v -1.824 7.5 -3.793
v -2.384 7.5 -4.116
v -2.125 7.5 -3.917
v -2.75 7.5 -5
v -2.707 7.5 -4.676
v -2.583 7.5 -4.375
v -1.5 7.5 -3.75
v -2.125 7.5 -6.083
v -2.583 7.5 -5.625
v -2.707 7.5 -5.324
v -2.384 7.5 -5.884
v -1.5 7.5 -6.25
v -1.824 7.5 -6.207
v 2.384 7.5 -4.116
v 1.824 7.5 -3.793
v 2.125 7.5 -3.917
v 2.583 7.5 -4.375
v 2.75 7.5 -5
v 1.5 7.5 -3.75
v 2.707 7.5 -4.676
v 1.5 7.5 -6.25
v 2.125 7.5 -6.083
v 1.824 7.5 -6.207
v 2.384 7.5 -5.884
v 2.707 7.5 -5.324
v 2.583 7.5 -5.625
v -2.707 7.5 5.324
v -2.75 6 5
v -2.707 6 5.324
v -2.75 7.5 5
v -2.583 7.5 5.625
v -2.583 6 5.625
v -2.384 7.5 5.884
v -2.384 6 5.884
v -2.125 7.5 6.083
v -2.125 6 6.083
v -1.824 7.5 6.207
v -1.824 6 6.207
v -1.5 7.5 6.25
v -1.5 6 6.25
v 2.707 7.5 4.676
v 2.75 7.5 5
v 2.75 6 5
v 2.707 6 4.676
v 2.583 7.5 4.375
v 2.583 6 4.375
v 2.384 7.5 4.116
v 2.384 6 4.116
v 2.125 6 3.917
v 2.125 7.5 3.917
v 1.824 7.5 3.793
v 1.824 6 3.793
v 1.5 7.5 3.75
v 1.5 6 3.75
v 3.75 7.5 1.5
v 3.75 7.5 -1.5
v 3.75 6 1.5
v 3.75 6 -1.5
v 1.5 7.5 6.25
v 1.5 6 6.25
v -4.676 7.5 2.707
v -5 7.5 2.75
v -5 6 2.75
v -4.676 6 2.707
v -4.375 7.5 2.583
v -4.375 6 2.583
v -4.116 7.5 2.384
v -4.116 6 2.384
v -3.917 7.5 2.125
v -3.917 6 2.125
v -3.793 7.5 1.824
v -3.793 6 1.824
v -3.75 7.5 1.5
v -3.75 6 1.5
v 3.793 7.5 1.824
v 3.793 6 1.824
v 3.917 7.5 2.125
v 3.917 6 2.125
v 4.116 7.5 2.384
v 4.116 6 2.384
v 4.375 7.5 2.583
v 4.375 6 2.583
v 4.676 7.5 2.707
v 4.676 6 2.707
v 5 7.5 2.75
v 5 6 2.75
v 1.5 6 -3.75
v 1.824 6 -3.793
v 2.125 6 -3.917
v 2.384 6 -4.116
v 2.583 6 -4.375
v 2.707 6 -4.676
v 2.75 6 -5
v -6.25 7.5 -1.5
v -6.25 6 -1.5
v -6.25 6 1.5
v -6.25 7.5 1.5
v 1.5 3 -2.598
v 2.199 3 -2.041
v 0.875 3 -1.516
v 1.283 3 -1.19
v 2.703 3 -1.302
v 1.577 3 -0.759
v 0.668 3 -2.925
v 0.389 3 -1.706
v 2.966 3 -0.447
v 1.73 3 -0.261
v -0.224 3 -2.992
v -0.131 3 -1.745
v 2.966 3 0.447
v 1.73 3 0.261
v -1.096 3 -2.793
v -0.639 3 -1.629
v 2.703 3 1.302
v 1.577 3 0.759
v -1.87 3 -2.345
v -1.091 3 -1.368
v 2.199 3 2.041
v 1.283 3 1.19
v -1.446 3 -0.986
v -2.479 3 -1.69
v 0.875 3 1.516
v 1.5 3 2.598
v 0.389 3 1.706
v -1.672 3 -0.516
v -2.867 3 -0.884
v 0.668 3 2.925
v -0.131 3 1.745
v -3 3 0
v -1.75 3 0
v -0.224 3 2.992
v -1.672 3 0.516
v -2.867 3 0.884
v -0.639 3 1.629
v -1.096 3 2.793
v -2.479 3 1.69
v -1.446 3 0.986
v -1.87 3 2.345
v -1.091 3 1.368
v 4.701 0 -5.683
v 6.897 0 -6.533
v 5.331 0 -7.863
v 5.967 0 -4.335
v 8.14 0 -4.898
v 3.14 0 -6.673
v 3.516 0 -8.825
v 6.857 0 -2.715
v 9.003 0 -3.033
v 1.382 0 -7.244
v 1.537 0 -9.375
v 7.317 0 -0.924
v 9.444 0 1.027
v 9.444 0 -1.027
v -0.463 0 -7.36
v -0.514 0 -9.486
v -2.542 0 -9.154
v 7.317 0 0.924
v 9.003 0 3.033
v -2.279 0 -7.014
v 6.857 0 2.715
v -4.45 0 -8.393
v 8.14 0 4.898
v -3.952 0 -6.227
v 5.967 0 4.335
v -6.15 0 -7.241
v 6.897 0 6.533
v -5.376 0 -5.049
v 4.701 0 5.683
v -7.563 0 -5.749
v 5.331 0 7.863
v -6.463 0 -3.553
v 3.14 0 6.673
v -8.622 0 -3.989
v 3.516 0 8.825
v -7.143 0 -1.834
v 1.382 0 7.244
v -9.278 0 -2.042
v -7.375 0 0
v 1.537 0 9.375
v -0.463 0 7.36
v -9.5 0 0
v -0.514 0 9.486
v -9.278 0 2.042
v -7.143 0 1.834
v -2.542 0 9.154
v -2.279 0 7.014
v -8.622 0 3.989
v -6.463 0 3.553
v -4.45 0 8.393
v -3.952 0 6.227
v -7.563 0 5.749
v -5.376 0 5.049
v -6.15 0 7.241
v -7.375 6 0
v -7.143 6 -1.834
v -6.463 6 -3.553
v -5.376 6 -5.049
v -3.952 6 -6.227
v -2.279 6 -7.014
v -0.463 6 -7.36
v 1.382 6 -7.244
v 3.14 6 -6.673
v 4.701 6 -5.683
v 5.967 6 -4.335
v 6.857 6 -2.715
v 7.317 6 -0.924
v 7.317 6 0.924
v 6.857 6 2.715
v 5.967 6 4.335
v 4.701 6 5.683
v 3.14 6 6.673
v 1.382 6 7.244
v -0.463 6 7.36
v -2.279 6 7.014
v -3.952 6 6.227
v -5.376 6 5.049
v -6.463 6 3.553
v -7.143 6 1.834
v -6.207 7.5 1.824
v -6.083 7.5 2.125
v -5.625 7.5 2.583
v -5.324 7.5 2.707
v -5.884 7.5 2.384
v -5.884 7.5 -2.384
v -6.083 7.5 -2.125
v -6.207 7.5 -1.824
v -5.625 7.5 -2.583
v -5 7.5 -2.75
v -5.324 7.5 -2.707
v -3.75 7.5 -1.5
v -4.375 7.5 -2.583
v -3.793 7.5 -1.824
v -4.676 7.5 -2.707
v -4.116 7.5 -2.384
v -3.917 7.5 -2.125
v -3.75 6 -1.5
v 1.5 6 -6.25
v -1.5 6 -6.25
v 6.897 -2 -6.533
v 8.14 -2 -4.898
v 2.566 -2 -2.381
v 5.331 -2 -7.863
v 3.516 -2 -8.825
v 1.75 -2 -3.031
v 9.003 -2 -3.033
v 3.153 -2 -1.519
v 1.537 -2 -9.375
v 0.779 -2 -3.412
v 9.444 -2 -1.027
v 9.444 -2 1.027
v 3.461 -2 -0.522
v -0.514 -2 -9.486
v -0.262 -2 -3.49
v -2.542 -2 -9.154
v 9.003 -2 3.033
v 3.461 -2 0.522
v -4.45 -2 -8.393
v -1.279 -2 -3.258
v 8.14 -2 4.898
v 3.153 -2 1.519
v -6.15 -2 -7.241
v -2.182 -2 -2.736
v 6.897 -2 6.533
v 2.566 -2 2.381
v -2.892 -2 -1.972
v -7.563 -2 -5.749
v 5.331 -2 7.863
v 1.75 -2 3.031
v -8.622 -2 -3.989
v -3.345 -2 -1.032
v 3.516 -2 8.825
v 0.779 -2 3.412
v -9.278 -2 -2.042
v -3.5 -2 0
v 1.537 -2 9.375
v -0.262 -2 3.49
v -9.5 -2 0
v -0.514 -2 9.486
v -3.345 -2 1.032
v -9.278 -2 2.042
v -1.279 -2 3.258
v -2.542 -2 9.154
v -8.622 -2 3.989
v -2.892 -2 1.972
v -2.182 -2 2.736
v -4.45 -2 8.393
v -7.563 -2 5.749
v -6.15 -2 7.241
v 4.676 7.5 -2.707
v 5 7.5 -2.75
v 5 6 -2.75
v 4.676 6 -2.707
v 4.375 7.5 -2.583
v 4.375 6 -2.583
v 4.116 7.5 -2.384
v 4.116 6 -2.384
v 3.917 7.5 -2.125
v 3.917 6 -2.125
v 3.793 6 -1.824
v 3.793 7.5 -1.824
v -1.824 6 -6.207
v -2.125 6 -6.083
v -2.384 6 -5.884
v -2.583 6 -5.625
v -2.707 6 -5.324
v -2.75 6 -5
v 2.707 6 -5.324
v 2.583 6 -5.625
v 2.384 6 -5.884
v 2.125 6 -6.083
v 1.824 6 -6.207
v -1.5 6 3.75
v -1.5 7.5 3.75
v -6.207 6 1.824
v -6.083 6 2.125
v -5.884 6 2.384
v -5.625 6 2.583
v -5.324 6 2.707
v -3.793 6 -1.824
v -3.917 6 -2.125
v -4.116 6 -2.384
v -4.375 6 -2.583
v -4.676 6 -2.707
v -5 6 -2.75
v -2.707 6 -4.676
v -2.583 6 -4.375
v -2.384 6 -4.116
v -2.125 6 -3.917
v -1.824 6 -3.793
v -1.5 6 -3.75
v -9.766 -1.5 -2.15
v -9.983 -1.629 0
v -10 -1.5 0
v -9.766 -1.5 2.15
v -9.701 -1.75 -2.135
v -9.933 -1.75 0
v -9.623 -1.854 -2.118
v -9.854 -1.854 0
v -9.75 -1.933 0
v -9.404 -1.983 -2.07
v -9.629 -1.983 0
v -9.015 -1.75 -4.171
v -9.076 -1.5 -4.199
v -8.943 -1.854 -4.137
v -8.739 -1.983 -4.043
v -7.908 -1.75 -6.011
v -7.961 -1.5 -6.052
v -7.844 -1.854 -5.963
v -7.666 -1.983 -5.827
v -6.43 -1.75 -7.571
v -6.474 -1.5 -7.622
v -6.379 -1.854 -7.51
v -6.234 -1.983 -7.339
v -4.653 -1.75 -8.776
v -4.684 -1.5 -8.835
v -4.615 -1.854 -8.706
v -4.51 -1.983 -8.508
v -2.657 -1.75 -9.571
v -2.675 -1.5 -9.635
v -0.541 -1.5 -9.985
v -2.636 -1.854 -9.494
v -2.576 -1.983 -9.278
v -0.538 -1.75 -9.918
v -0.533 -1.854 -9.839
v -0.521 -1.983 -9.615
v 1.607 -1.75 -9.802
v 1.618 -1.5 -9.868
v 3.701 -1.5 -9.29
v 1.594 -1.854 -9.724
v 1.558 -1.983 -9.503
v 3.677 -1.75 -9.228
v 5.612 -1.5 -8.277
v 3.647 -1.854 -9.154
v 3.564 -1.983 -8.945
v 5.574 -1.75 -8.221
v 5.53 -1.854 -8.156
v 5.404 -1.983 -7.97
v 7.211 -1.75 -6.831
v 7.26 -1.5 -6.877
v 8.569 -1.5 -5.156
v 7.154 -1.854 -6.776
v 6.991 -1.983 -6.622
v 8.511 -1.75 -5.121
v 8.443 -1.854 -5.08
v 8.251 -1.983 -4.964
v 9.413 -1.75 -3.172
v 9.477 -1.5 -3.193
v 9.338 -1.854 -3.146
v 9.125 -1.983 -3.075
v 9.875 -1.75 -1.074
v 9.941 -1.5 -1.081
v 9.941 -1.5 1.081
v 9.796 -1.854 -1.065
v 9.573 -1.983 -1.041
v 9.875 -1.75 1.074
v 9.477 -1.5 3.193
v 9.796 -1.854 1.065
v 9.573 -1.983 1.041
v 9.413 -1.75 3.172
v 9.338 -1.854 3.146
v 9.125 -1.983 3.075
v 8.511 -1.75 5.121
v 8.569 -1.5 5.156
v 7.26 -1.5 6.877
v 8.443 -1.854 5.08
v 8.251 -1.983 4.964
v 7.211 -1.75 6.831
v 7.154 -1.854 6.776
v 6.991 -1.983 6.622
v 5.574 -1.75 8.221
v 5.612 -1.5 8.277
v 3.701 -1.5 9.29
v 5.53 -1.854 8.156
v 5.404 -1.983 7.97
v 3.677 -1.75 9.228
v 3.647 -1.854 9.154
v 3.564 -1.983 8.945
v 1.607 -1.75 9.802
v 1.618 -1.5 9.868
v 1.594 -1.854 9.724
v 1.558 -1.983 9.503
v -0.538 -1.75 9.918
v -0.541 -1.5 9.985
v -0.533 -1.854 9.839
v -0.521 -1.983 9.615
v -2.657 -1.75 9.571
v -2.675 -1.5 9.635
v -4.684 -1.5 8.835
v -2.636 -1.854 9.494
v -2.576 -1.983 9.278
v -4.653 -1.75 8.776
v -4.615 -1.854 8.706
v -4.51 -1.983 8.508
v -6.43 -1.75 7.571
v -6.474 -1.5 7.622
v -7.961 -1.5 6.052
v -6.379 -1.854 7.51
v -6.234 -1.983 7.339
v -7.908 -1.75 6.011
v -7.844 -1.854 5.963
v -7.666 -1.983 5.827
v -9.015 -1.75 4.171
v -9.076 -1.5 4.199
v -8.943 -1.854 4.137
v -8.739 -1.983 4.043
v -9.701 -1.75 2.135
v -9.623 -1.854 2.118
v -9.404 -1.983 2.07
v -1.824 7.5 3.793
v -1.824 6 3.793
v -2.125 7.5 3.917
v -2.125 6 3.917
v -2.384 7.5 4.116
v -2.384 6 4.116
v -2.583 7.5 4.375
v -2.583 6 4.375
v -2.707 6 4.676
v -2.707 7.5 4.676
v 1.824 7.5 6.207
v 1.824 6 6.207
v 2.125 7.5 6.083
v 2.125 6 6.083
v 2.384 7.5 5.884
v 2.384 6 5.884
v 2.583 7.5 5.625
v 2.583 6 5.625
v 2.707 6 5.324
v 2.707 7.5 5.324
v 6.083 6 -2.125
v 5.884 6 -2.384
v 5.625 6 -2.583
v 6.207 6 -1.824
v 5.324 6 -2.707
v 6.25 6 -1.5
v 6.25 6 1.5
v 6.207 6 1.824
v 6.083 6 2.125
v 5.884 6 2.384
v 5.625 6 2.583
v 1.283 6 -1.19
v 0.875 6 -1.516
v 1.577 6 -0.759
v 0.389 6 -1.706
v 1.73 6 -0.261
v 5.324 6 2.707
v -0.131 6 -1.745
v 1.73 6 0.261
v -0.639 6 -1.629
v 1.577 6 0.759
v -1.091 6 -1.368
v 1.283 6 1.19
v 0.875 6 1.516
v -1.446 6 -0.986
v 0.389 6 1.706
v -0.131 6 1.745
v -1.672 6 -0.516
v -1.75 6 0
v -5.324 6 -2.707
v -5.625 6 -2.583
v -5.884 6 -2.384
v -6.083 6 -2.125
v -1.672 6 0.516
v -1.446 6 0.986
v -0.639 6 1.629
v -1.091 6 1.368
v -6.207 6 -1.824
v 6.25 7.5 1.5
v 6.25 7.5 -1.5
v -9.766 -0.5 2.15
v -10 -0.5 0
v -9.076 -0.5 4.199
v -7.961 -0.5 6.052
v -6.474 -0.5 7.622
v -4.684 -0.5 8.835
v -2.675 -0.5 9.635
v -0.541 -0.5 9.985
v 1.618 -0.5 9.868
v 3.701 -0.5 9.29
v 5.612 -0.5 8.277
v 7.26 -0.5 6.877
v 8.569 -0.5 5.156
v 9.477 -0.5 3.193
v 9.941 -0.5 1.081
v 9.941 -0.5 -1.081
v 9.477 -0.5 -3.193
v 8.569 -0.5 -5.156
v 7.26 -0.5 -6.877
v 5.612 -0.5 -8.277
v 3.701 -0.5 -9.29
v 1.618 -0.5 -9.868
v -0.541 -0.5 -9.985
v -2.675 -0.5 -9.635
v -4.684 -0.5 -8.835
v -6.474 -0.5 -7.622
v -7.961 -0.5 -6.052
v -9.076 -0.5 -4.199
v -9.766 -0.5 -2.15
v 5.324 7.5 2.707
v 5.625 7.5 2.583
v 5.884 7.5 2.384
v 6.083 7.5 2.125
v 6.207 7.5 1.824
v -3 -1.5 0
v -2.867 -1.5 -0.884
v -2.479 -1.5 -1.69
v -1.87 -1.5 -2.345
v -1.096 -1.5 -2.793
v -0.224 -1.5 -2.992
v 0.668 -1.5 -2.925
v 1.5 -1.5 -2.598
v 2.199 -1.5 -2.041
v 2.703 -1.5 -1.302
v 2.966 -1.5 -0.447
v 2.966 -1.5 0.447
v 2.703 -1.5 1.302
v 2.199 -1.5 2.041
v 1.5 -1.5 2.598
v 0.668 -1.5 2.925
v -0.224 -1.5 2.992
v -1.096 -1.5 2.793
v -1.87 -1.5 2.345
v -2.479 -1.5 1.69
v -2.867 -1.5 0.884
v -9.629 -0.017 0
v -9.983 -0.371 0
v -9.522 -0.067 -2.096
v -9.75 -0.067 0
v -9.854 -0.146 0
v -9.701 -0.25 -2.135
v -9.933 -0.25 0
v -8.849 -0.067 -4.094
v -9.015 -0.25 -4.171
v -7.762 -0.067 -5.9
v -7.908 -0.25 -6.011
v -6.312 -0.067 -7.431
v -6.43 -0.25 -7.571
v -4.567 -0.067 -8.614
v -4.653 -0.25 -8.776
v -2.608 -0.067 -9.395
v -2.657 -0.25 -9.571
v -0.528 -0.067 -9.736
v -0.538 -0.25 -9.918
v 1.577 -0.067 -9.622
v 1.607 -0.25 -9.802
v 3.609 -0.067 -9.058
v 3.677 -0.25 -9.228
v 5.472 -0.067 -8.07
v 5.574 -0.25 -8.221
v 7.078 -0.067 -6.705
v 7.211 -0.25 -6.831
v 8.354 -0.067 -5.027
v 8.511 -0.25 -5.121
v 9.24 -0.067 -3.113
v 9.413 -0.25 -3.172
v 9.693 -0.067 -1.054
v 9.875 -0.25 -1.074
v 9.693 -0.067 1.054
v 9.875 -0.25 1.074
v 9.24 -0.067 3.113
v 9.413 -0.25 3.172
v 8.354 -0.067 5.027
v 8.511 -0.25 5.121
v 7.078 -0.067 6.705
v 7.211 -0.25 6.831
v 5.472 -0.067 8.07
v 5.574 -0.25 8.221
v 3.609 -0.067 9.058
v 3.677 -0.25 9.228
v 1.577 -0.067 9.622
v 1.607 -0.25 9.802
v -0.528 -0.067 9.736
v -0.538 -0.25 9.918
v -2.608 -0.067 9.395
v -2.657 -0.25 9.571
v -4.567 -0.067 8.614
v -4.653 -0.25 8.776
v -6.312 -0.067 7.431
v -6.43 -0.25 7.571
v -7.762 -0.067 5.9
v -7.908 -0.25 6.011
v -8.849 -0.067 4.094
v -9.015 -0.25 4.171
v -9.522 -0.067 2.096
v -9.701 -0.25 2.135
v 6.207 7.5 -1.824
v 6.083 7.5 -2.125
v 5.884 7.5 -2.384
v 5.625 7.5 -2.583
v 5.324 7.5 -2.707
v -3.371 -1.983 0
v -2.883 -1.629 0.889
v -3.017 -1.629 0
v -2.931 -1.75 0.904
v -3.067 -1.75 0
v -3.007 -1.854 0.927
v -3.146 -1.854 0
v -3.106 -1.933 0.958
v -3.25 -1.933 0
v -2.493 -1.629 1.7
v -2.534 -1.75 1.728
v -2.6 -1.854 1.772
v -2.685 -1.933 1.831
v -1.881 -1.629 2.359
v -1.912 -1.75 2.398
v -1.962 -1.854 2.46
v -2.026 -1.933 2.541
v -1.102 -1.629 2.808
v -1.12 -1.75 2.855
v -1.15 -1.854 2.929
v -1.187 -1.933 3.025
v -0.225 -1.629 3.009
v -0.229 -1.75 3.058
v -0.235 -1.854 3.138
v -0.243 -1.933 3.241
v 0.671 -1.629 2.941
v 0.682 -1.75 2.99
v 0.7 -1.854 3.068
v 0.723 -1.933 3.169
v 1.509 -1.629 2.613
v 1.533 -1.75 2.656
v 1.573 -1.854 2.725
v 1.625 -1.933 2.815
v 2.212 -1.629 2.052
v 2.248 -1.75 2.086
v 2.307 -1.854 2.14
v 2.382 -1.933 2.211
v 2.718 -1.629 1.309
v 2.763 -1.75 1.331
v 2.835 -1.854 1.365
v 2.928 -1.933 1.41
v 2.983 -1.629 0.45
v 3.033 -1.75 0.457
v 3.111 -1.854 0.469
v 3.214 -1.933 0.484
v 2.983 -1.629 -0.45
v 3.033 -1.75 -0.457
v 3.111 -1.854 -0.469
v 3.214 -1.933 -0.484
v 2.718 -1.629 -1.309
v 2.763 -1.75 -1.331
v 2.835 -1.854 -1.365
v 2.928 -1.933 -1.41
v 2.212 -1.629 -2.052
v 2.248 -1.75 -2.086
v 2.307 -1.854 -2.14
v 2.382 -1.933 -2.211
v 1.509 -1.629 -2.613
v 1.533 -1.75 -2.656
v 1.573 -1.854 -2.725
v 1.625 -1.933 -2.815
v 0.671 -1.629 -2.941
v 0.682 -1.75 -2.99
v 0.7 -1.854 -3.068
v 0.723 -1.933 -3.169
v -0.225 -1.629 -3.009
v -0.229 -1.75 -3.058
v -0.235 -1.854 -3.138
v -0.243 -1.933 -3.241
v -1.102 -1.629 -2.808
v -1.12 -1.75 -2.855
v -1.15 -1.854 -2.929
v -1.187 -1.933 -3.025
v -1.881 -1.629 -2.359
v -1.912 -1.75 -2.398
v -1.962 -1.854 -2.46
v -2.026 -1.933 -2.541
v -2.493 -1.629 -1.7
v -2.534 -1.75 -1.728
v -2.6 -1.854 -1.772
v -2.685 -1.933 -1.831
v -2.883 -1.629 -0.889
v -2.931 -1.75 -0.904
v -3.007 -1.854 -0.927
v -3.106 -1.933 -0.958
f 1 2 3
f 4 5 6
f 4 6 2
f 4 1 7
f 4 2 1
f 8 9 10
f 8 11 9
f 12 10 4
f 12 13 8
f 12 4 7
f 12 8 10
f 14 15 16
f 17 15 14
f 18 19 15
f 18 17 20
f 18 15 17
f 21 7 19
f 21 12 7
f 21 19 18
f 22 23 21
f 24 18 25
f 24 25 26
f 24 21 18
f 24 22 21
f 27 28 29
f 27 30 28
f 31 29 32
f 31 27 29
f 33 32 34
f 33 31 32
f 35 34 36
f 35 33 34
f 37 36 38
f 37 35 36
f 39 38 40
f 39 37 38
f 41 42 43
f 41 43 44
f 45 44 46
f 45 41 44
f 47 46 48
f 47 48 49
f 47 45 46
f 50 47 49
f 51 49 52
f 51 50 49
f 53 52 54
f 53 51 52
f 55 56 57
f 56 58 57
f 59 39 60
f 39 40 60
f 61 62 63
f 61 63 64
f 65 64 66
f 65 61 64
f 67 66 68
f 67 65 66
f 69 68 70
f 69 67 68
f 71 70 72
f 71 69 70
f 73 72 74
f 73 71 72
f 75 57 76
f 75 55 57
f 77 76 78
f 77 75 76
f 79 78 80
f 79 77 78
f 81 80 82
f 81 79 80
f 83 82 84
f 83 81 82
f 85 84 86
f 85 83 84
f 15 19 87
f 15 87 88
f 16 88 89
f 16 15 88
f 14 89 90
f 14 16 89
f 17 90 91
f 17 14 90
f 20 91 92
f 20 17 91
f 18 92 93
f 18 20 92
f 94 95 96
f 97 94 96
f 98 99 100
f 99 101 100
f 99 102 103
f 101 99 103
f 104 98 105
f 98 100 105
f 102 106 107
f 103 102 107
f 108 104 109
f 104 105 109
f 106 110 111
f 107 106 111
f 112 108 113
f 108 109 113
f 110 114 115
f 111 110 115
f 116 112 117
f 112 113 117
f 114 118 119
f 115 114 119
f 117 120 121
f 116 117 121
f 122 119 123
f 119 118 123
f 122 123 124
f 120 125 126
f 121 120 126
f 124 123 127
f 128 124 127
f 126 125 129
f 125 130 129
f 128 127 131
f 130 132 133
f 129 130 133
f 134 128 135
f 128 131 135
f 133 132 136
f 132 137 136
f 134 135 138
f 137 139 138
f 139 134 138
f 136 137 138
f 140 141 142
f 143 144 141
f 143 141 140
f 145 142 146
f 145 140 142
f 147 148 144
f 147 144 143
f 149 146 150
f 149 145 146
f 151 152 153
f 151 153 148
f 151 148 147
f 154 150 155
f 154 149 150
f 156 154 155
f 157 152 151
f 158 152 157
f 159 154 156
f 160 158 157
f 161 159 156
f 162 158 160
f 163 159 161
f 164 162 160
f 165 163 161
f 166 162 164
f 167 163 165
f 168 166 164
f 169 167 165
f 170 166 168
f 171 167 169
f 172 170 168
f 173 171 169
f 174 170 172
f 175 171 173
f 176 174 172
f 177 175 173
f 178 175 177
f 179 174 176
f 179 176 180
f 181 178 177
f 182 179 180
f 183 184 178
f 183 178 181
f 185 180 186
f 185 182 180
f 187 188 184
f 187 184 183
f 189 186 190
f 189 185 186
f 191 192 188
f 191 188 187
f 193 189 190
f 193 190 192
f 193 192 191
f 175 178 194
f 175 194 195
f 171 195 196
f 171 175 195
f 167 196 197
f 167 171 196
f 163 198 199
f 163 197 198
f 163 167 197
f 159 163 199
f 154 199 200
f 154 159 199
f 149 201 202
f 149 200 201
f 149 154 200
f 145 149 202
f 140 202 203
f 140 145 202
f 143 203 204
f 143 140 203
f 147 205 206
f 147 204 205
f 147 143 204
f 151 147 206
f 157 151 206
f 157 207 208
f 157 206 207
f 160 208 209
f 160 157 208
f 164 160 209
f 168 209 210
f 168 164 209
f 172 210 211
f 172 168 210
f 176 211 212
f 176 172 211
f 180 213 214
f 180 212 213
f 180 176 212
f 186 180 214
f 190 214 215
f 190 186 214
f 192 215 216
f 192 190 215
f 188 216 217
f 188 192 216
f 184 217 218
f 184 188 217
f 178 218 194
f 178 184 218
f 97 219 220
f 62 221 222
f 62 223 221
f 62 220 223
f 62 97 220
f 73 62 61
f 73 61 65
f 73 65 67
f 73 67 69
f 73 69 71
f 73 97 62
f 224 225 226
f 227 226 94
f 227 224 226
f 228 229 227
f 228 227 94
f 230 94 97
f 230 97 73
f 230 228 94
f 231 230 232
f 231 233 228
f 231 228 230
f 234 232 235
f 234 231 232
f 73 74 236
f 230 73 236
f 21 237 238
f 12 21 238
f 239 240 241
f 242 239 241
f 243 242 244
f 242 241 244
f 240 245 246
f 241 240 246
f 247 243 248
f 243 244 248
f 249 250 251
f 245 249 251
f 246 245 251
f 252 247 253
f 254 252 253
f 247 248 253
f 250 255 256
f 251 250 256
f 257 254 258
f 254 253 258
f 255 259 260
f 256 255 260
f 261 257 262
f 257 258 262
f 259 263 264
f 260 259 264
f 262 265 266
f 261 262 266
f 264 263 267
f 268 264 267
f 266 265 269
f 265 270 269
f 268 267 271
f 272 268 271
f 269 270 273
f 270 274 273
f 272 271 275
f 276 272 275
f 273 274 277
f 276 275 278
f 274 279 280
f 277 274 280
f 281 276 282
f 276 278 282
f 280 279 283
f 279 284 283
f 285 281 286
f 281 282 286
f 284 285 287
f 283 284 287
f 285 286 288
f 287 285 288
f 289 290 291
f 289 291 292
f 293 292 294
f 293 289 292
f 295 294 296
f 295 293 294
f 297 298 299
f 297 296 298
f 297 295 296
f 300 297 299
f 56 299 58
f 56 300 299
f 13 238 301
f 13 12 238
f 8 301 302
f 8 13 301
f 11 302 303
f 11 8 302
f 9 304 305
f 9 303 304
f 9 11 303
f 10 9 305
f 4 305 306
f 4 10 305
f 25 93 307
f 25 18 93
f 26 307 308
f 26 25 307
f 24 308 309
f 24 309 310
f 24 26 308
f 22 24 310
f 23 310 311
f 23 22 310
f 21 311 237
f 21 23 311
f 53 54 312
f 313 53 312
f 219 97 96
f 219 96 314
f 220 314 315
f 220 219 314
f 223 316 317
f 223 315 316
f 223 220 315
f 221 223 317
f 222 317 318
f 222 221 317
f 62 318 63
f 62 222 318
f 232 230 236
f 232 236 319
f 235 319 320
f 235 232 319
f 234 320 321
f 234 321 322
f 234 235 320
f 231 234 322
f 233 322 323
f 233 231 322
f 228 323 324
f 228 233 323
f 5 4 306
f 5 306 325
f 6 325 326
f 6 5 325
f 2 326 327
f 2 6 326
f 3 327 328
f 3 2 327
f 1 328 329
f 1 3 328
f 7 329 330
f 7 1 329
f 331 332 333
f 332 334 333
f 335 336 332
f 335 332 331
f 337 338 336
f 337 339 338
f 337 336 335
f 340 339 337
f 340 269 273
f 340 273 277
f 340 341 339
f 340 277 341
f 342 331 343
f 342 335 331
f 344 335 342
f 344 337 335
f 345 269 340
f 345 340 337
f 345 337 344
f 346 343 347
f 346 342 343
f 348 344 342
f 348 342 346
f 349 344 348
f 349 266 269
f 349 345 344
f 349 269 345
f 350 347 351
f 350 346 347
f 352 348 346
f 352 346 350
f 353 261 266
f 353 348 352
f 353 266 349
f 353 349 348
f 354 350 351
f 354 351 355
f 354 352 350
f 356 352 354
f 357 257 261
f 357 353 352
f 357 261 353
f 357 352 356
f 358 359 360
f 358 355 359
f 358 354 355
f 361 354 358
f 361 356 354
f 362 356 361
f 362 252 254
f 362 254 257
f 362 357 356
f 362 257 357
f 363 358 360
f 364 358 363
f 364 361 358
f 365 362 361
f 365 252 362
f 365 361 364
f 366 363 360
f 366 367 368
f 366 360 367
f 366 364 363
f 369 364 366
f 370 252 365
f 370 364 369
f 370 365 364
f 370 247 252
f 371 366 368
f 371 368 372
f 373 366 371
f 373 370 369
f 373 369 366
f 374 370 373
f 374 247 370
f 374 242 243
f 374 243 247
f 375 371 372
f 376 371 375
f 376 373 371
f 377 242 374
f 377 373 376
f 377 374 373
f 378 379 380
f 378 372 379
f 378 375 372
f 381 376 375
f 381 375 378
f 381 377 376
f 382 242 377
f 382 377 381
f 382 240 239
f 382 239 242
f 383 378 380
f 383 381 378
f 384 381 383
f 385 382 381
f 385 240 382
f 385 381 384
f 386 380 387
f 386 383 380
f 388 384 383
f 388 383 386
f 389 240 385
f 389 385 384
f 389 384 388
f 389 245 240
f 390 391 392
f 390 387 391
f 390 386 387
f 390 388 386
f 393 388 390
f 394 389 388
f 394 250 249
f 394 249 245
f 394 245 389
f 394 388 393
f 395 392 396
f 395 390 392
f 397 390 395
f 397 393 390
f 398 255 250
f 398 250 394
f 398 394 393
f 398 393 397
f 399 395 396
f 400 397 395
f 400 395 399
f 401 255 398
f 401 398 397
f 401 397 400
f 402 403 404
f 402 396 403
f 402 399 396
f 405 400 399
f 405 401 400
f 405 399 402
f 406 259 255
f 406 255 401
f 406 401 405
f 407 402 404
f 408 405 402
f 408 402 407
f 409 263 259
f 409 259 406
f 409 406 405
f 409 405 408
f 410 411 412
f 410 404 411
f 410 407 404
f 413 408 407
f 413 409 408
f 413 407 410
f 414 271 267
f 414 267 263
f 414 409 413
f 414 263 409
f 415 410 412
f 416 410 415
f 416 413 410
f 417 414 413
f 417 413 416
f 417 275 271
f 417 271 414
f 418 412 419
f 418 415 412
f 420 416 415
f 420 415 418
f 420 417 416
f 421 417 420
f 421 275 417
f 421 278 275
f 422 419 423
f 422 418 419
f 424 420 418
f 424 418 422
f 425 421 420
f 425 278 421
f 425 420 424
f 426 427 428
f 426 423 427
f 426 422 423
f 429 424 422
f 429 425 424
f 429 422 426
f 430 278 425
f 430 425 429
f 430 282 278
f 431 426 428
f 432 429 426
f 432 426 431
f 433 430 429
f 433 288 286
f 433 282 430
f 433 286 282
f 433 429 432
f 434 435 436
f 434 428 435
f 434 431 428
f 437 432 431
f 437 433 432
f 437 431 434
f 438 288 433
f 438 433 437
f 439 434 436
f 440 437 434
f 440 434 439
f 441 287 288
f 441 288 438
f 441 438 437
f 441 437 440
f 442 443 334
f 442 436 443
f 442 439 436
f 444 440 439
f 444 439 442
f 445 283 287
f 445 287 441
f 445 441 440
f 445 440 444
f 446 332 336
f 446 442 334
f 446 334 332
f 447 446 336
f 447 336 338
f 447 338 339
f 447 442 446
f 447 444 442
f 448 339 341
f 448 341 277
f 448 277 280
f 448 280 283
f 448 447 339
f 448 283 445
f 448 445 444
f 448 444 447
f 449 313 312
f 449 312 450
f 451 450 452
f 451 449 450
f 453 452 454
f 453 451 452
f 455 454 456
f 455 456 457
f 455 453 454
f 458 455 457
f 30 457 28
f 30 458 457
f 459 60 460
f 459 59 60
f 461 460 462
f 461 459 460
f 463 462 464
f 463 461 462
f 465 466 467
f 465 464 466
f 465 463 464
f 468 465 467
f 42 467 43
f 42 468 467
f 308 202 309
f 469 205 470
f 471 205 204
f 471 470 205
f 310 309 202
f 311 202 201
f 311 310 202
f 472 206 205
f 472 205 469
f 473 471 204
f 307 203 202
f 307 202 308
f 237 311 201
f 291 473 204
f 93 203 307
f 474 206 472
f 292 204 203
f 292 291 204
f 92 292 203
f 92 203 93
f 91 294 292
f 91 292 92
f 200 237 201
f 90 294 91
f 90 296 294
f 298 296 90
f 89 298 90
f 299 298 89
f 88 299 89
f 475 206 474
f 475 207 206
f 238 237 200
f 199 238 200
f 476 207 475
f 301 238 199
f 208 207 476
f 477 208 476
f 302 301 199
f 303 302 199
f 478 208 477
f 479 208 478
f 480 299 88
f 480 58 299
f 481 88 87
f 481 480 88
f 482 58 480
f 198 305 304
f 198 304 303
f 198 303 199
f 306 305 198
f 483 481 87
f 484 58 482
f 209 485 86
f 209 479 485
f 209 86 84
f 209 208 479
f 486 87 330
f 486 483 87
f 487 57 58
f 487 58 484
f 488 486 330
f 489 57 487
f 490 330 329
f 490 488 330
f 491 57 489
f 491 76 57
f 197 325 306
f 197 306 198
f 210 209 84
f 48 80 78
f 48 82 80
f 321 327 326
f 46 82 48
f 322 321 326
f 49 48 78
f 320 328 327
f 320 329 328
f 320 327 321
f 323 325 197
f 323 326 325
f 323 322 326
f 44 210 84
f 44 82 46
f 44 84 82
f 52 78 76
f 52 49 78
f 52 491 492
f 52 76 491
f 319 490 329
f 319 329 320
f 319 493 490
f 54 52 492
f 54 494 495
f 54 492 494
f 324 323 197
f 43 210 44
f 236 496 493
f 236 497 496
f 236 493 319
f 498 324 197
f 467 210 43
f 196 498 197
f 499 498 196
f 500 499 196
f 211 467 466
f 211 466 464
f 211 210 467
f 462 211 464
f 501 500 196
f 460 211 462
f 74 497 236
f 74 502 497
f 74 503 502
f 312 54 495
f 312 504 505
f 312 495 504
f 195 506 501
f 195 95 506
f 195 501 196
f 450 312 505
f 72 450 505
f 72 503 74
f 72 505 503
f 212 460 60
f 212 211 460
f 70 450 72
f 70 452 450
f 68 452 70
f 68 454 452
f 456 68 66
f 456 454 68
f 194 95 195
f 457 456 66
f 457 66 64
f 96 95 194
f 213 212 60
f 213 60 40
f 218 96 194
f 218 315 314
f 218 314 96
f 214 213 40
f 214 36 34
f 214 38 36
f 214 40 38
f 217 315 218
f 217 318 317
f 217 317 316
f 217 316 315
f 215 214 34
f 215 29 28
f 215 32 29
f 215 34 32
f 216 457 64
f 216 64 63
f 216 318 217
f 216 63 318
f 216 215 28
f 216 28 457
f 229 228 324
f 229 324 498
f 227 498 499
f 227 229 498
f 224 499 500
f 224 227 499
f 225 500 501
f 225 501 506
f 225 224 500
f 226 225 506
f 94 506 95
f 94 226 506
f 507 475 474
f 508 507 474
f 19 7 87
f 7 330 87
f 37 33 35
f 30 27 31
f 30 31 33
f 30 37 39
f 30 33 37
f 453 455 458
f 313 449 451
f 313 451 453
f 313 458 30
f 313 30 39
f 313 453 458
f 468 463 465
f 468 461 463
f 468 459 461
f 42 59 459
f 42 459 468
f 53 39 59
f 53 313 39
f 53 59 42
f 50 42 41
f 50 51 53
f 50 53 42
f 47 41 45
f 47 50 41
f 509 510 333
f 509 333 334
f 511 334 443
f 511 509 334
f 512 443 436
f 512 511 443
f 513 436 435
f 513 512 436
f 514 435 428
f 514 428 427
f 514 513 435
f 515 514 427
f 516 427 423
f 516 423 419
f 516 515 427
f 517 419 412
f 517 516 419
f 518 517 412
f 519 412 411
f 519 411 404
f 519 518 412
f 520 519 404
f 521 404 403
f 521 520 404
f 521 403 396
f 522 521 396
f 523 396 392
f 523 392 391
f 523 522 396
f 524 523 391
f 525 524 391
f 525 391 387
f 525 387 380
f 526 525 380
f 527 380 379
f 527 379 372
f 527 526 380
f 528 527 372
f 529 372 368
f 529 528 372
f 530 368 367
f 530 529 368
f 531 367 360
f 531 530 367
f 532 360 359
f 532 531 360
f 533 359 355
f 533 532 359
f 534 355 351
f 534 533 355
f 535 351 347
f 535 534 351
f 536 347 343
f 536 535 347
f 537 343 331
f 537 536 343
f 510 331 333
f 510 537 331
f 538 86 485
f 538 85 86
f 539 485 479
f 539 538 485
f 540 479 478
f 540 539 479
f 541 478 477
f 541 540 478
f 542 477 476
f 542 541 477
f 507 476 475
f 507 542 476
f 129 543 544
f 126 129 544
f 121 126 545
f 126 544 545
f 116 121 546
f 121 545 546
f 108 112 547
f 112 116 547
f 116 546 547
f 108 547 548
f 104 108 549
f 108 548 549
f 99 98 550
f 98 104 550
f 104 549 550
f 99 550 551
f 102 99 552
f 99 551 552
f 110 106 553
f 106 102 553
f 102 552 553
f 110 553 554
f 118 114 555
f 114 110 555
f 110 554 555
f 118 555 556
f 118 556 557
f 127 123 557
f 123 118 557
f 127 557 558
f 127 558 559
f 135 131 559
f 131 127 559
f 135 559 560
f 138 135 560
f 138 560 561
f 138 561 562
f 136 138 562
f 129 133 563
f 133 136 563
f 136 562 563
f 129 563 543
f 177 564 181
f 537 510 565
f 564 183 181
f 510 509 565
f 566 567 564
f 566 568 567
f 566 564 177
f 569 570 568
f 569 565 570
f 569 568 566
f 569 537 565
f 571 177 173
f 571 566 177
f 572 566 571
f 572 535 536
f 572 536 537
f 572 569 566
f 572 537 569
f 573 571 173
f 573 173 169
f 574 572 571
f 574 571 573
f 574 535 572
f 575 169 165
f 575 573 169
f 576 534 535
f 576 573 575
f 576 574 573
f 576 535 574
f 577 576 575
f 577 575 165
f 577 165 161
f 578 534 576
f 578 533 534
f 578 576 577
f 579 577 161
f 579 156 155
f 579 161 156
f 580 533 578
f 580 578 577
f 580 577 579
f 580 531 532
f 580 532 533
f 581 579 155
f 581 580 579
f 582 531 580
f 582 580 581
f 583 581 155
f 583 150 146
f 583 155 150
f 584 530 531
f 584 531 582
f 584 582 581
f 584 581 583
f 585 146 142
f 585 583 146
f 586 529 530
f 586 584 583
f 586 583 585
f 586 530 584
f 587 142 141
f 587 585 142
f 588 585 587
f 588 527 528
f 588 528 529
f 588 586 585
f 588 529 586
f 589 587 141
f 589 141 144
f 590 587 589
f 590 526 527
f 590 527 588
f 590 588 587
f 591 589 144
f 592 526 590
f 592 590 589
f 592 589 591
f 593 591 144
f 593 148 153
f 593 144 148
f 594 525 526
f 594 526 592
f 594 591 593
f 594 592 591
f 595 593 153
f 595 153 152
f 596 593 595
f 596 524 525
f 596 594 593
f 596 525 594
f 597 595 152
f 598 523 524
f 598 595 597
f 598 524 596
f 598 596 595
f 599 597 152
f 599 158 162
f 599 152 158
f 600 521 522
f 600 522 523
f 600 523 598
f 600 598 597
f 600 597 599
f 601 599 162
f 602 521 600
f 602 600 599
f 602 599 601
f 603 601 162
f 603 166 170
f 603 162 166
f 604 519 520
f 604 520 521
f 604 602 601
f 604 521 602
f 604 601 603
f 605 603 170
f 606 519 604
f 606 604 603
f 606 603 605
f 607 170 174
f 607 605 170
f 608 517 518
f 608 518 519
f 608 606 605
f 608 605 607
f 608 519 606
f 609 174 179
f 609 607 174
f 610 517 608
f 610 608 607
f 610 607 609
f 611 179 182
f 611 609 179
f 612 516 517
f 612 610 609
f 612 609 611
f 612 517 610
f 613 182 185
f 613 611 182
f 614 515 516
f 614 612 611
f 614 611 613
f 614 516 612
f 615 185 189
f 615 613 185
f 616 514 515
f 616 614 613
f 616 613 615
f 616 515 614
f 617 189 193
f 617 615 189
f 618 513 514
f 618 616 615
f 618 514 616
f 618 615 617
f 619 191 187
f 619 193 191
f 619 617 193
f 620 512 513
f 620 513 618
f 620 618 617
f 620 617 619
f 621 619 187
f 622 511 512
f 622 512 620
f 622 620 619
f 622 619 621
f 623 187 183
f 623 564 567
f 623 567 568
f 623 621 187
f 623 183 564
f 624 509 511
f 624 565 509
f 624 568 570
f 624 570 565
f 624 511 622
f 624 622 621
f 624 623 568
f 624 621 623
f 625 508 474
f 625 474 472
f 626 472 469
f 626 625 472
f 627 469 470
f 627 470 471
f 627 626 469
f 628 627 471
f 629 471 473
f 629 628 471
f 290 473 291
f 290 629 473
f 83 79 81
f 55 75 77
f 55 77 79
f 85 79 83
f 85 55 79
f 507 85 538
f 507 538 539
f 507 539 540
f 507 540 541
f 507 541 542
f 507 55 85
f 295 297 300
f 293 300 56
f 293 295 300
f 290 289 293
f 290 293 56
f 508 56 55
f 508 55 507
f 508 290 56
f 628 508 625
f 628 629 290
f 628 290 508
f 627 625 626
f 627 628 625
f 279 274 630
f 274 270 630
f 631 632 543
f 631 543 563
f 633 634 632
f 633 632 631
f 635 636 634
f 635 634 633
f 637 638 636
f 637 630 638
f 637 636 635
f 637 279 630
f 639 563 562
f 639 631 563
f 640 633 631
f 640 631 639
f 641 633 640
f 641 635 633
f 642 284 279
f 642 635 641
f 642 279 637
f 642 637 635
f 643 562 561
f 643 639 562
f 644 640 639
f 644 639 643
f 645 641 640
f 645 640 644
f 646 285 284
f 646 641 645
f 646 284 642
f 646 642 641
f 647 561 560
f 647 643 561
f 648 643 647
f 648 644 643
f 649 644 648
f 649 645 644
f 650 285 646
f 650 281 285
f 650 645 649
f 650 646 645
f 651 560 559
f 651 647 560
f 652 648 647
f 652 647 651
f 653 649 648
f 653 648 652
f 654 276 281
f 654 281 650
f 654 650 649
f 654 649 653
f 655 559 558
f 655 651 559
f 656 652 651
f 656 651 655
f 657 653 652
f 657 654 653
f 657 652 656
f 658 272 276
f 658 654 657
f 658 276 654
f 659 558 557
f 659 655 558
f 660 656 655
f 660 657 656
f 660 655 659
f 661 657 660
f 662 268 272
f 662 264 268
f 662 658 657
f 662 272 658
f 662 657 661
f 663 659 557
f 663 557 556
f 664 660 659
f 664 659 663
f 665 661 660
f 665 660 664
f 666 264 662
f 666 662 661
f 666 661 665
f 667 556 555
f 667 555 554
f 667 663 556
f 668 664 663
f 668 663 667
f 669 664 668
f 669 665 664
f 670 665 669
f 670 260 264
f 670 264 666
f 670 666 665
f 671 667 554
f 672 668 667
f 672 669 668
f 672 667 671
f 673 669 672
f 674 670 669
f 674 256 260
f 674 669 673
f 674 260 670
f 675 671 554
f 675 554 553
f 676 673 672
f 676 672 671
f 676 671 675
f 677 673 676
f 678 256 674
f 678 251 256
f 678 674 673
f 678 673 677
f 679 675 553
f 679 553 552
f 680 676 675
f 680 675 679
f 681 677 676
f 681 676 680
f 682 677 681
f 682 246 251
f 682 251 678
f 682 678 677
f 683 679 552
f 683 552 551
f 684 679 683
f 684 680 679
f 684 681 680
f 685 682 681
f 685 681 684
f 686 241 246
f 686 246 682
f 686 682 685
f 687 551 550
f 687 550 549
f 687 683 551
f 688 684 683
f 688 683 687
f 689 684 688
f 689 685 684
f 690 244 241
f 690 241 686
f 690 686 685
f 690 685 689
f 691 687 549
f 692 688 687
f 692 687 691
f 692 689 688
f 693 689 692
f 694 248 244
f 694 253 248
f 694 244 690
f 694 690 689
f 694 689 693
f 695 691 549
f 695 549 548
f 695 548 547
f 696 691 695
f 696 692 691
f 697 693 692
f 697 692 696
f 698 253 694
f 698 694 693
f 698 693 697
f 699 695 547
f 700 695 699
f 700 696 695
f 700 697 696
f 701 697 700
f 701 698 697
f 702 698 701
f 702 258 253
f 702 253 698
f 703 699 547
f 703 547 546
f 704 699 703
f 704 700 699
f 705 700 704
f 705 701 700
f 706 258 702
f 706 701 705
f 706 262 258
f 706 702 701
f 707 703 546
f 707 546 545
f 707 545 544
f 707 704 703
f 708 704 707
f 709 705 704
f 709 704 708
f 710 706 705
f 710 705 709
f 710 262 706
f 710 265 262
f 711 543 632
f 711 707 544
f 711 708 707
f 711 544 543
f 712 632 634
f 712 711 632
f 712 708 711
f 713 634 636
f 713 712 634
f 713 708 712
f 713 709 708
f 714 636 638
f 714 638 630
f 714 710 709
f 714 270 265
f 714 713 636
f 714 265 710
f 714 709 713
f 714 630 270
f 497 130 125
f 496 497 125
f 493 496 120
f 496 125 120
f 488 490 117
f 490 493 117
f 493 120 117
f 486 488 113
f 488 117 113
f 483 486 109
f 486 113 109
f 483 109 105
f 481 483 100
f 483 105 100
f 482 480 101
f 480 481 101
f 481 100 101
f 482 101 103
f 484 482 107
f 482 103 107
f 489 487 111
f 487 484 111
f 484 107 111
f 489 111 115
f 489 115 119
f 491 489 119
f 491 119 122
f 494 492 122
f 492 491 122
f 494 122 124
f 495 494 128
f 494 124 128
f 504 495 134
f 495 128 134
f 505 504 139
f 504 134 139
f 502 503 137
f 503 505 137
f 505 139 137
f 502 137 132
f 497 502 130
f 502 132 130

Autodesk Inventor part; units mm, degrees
ref_plane "YZ Plane" through (0, 0, 0) normal (1, 0, 0) x (0, 1, 0)
ref_plane "XZ Plane" through (0, 0, 0) normal (0, 1, 0) x (-1, 0, 0)
ref_plane "XY Plane" through (0, 0, 0) normal (0, 0, 1) x (1, 0, 0)
sketch "Sketch1" plane through (0, 0, 0) normal (0, 1, 0) x (-1, 0, 0)
  circle A0 centre (0, 0) radius 7.375
  circle A1 centre (0, 0) radius 1.75
  circle A2 centre (0, 0) radius 10
  circle A3 centre (0, 0) radius 3
  dimension "d0" = 14.75
  dimension "d1" = 3.5
  dimension "d2" = 20
  dimension "d7" = 6
extrude "Extrusion1" add sketch "Sketch1" along normal blind 6 contours A0 | A3
extrude "Extrusion2" add sketch "Sketch1" against normal blind 2 contours A0 | A2
sketch "Sketch2" plane through (0, 6, 0) normal (0, 1, 0) x (1, 0, 0)
  line L0 (3.75, -2.75) -> (6.25, -2.75)
  line L1 (6.25, -2.75) -> (6.25, 2.75)
  line L2 (6.25, 2.75) -> (3.75, 2.75)
  line L3 (3.75, 2.75) -> (3.75, -2.75)
  line L4 (3.75, -2.75) -> (6.25, 2.75) construction
  line L5 (6.25, -2.75) -> (3.75, 2.75) construction
  line L6 (-2.75, 3.75) -> (2.75, 3.75)
  line L7 (2.75, 3.75) -> (2.75, 6.25)
  line L8 (2.75, 6.25) -> (-2.75, 6.25)
  line L9 (-2.75, 6.25) -> (-2.75, 3.75)
  line L10 (-3.75, -2.75) -> (-3.75, 2.75)
  line L11 (-3.75, 2.75) -> (-6.25, 2.75)
  line L12 (-6.25, 2.75) -> (-6.25, -2.75)
  line L13 (-6.25, -2.75) -> (-3.75, -2.75)
  line L14 (2.75, -3.75) -> (-2.75, -3.75)
  line L15 (-2.75, -3.75) -> (-2.75, -6.25)
  line L16 (-2.75, -6.25) -> (2.75, -6.25)
  line L17 (2.75, -6.25) -> (2.75, -3.75)
  point P0 (0, 0)
  point P1 (5, 0)
  dimension "d10" = 5.5
  dimension "d11" = 2.5
  dimension "d12" = 5
  dimension "d13" = 0
  dimension "d16" = 360
extrude "Extrusion4" add sketch "Sketch2" along normal blind 1.5
fillet "Fillet1" radius 1.25 16 edges at (6.25, 6.75, -2.75) (3.75, 6.75, -2.75) (6.25, 6.75, 2.75) (3.75, 6.75, 2.75) (2.75, 6.75, 3.75) (2.75, 6.75, 6.25) (-2.75, 6.75, 6.25) (-2.75, 6.75, 3.75) (-3.75, 6.75, 2.75) (-6.25, 6.75, 2.75) (-6.25, 6.75, -2.75) (-3.75, 6.75, -2.75) (-2.75, 6.75, -6.25) (-2.75, 6.75, -3.75) (2.75, 6.75, -6.25) (2.75, 6.75, -3.75)
fillet "Fillet2" radius 0.5 3 edges at (10, -2, 0) (10, 0, 0) (3, -2, 0)
extrude "Extrusion5" cut sketch "Sketch1" along normal blind 3 contours A3
equation "\"d0\" = ShaftDiameter"
equation "\"d1\" = HoleDiameter"
equation "\"d2\" = CapDiameter"
equation "\"d3\" = ShaftLength"
equation "\"d5\" = CapLength"
equation "\"d18\" = TabLength"
equation "\"CapDiameter\" = 20"
equation "\"HoleDiameter\" = 3.5"
equation "\"ShaftLength\" = FEMUR_HEIGHT"
equation "\"CapLength\" = 2"
equation "\"HoleLength\" = 5"
equation "\"TabLength\" = 1.5"
equation "\"ShaftDiameter\" = 14.75"
equation "\"FEMUR_HEIGHT\" = 6"
properties part number "AxleCap"
